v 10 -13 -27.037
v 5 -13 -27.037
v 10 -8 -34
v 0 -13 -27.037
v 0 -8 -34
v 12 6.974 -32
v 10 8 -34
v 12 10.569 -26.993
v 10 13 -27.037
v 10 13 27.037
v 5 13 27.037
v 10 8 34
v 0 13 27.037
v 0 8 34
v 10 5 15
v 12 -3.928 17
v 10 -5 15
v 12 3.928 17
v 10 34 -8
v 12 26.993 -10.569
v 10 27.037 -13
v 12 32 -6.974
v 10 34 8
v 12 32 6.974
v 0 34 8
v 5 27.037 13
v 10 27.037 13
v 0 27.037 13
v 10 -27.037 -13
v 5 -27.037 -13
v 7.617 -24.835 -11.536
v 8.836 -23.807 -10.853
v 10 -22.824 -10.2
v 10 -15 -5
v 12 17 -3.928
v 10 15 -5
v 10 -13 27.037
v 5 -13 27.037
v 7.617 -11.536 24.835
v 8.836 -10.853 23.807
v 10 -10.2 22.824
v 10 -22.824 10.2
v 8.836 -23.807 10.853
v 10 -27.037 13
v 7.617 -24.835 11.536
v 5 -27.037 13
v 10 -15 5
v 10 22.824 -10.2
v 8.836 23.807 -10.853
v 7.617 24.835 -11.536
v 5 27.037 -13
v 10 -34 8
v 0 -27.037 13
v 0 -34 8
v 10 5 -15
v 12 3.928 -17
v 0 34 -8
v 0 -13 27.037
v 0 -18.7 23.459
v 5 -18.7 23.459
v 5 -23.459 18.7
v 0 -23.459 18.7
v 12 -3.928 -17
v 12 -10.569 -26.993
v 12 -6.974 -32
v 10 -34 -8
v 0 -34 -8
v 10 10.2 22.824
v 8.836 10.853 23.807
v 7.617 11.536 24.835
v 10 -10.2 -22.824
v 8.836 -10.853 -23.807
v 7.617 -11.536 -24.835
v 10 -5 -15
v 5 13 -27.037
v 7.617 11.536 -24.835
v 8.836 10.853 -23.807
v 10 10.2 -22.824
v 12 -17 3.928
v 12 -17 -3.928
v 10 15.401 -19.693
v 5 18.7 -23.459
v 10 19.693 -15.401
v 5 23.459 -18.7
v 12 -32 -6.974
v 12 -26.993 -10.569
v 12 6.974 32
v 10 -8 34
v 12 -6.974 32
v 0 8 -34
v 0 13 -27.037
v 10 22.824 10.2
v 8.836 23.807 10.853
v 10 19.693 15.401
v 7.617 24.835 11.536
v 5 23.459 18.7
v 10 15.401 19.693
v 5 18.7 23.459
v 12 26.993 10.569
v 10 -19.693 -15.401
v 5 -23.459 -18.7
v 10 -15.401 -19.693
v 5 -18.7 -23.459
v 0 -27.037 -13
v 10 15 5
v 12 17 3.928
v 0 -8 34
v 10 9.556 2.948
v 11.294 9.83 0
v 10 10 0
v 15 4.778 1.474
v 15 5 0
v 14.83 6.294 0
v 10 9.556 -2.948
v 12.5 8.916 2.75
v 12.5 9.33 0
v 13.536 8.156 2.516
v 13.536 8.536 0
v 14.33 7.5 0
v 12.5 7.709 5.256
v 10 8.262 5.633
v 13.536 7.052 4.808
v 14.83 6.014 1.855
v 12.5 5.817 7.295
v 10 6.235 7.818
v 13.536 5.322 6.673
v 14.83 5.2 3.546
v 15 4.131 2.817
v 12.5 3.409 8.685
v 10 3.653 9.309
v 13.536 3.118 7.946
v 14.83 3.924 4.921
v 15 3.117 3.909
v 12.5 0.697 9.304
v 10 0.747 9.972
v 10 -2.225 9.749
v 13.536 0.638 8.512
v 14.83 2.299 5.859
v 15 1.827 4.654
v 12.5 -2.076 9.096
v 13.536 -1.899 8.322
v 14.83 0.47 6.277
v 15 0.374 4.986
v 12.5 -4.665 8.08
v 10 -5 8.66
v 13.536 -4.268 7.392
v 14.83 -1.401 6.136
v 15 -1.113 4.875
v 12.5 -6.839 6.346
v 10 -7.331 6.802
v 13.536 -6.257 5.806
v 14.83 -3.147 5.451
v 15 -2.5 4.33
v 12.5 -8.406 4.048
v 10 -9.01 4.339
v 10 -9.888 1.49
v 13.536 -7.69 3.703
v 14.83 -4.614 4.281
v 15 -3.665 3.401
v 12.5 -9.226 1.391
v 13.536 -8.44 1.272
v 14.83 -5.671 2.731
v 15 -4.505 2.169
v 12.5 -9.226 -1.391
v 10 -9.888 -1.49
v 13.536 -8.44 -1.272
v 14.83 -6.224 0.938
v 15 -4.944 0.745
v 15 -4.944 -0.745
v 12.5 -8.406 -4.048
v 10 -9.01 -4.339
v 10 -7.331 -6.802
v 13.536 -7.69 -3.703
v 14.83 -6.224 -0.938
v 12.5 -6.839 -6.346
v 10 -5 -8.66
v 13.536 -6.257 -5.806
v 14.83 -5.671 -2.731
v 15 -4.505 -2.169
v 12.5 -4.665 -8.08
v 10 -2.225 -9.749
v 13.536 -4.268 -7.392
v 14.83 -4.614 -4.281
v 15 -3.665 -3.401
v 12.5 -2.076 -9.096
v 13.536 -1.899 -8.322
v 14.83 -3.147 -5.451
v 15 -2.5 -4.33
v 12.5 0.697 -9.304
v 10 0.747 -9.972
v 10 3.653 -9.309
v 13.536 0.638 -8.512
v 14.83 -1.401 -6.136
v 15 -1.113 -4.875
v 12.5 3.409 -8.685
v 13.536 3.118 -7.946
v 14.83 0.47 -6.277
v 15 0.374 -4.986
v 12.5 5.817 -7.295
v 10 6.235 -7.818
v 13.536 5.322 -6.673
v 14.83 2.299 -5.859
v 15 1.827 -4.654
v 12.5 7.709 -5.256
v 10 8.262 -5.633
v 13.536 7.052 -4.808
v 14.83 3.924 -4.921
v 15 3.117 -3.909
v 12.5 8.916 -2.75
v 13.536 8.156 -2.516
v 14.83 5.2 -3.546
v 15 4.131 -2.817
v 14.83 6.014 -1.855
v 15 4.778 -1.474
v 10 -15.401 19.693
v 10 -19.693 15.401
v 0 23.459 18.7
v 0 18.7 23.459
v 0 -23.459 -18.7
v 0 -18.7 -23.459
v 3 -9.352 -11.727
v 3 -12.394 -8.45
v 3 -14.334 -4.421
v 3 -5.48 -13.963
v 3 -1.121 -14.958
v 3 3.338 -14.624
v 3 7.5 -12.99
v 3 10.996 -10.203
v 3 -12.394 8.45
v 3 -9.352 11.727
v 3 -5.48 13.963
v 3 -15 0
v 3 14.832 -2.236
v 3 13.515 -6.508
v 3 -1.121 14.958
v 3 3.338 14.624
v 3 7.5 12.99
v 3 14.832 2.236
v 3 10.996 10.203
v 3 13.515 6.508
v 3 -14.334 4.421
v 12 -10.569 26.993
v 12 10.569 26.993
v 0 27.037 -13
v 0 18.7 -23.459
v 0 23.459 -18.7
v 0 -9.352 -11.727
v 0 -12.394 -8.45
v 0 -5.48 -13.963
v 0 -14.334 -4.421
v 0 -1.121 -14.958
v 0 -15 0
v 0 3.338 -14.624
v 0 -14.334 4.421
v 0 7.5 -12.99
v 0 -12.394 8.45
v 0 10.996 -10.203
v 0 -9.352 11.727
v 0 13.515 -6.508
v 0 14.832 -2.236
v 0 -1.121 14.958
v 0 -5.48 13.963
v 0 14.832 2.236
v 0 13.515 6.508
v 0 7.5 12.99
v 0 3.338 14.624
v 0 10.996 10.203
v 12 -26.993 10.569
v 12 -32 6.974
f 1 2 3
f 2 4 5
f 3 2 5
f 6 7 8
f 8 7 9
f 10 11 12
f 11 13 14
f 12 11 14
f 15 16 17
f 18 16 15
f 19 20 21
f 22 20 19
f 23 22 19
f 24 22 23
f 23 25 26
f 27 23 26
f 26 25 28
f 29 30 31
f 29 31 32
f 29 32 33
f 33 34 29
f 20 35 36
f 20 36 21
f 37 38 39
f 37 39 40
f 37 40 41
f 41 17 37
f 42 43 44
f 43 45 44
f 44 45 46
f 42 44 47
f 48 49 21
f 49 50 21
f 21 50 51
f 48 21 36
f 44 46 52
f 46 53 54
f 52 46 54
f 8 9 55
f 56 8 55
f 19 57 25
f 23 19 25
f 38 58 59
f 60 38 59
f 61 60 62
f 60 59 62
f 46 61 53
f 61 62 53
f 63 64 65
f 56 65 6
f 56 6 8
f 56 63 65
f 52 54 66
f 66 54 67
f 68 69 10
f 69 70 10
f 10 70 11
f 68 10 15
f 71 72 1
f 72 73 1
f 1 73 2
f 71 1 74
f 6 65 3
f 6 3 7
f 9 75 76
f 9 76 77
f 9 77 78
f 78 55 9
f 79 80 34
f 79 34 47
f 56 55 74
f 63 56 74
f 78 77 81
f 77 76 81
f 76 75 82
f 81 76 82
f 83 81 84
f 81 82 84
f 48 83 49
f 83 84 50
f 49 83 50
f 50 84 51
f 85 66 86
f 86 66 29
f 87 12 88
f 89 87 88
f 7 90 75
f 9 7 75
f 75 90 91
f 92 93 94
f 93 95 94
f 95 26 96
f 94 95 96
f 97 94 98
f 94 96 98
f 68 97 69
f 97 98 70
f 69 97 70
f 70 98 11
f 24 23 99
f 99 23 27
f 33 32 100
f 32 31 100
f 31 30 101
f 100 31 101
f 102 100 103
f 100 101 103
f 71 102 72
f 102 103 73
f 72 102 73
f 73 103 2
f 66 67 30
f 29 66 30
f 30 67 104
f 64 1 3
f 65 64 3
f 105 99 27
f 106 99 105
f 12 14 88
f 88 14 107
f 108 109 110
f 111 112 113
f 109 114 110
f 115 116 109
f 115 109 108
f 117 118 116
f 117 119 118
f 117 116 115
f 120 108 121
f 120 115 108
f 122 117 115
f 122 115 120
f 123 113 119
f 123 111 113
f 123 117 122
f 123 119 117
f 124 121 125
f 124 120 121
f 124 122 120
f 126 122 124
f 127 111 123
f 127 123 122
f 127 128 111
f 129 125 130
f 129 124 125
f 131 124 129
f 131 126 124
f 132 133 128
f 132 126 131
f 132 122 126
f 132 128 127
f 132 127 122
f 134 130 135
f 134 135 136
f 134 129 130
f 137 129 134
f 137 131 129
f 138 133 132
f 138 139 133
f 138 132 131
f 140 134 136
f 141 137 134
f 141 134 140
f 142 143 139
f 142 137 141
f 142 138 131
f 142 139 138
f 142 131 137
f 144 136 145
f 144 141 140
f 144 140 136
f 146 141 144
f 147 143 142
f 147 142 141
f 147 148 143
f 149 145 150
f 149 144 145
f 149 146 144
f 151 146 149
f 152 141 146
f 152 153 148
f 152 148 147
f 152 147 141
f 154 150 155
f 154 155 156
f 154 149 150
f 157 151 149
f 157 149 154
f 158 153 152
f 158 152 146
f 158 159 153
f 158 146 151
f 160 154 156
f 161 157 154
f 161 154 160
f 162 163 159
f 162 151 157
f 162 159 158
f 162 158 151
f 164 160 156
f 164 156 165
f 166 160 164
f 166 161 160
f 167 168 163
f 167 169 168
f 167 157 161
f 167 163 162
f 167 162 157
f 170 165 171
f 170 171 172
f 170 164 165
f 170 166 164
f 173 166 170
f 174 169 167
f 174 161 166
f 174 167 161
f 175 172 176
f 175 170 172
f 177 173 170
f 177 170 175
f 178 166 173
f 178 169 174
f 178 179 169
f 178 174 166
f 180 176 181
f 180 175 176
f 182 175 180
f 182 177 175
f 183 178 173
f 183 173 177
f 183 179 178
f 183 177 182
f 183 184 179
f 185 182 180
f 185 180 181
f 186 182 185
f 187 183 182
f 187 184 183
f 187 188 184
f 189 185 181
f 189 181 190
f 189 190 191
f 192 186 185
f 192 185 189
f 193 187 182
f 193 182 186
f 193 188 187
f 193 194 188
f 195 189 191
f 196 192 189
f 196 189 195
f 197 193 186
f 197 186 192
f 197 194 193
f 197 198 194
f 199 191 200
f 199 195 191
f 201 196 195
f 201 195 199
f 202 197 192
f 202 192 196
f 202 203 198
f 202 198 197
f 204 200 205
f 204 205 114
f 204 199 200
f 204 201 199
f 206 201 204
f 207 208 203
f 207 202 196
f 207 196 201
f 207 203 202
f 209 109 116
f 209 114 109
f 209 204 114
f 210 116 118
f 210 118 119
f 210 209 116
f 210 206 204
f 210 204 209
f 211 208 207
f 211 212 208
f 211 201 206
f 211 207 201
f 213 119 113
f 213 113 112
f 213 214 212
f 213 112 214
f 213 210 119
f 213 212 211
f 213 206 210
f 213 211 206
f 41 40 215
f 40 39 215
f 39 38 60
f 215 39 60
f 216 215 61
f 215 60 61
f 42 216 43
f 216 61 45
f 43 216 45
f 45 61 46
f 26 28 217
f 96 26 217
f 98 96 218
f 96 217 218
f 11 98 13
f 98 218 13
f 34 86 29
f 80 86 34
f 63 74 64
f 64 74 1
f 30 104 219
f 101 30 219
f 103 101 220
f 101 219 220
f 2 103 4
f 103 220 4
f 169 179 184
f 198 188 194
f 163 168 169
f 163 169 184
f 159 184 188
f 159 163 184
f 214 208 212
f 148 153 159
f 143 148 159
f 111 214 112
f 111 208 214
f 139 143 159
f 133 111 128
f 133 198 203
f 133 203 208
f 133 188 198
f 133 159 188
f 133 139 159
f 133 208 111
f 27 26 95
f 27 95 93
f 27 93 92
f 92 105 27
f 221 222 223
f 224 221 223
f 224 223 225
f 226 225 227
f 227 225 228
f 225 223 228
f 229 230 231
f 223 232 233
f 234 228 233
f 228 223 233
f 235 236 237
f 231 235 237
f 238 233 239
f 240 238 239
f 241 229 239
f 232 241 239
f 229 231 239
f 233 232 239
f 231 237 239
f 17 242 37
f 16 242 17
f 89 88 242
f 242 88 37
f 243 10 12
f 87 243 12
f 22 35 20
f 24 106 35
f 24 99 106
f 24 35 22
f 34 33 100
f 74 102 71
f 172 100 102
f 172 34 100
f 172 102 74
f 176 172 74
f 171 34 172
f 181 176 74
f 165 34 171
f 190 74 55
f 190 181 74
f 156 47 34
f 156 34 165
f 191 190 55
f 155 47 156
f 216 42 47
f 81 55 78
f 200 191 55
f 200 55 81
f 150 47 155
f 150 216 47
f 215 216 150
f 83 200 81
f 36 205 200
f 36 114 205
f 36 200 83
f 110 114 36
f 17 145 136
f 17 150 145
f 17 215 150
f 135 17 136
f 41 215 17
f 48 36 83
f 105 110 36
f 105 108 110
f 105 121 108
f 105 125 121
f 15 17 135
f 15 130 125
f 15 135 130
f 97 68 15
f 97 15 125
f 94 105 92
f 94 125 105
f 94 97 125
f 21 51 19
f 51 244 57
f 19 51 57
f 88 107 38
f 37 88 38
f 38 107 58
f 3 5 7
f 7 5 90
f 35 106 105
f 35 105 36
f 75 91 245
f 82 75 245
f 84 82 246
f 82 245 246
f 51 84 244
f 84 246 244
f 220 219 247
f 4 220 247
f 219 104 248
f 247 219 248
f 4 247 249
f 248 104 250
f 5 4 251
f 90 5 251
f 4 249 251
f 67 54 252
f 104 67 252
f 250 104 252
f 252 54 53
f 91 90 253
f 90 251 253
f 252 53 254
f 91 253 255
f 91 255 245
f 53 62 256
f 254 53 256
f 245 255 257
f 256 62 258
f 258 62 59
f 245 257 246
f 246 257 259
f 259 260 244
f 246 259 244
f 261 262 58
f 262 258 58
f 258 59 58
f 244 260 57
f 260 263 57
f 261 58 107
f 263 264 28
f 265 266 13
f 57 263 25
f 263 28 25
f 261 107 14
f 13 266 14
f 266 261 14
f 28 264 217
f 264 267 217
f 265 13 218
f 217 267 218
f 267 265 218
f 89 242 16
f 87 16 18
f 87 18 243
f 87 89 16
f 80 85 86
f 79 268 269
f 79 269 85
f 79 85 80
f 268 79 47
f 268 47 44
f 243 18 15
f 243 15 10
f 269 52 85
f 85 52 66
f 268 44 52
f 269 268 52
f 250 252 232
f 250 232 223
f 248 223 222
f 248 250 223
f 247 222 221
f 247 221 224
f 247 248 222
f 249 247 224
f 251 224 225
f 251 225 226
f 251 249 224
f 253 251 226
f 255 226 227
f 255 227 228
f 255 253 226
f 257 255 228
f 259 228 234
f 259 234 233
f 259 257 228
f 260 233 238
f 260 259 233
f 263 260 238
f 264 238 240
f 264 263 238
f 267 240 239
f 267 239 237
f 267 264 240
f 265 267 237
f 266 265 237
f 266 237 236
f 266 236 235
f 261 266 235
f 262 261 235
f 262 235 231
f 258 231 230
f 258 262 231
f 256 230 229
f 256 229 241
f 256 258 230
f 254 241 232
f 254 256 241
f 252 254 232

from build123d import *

# Parameters (mm, degrees)
F1_DEPTH = 10
F2_DEPTH = 12
F3_SIZE  = 5
F4_SIZE  = 1.99999
F5_R     = 10
F6_DEPTH = 5
F7_R     = 4.99999
F9_DEPTH = 3


# Not quite as in the source:
# - a fillet or chamfer is up to 0.001 mm smaller than in the source, because OpenCascade refuses the exact size


with BuildPart() as f1:
    # F0 (on Right) → F1 (new body)
    with BuildSketch(Plane.YZ):
        with BuildLine():
            Line((15, 5), (27.0370116692, 13))
            ThreePointArc((27.0370116692, 13), (21.2132034356, 21.2132034356), (13, 27.0370116692))
            Line((13, 27.0370116692), (5, 15))
            Line((5, 15), (0, 15))
            Line((0, 15), (-5, 15))
            Line((-5, 15), (-13, 27.0370116692))
            ThreePointArc((-13, 27.0370116692), (-21.2132034356, 21.2132034356), (-27.0370116692, 13))
            Line((-27.0370116692, 13), (-15, 5))
            Line((-15, 5), (-15, 0))
            Line((-15, 0), (-15, -5))
            Line((-15, -5), (-27.0370116692, -13))
            ThreePointArc((-27.0370116692, -13), (-21.2132034356, -21.2132034356), (-13, -27.0370116692))
            Line((-13, -27.0370116692), (-5, -15))
            Line((-5, -15), (0, -15))
            Line((0, -15), (5, -15))
            Line((5, -15), (13, -27.0370116692))
            ThreePointArc((13, -27.0370116692), (21.2132034356, -21.2132034356), (27.0370116692, -13))
            Line((27.0370116692, -13), (15, -5))
            Line((15, -5), (15, 0))
            Line((15, 0), (15, 5))
        make_face()
    extrude(amount=F1_DEPTH)

    # F0 (on Right) → F2 (join)
    with BuildSketch(Plane.YZ):
        with BuildLine():
            ThreePointArc((27.0370116692, -13), (29.2498747867, -6.6666952054), (30, 0))
            ThreePointArc((30, 0), (29.2498747867, 6.6666952054), (27.0370116692, 13))
            Line((27.0370116692, 13), (15, 5))
            Line((15, 5), (15, 0))
            Line((15, 0), (15, -5))
            Line((15, -5), (27.0370116692, -13))
        make_face()
        with BuildLine():
            ThreePointArc((27.0370116692, 13), (29.2498747867, 6.6666952054), (30, 0))
            ThreePointArc((30, 0), (29.2498747867, -6.6666952054), (27.0370116692, -13))
            Line((27.0370116692, -13), (34, -8))
            Line((34, -8), (34, 0))
            Line((34, 0), (34, 8))
            Line((34, 8), (27.0370116692, 13))
        make_face()
        with BuildLine():
            Line((5, 15), (13, 27.0370116692))
            ThreePointArc((13, 27.0370116692), (0, 30), (-13, 27.0370116692))
            Line((-13, 27.0370116692), (-5, 15))
            Line((-5, 15), (0, 15))
            Line((0, 15), (5, 15))
        make_face()
        with BuildLine():
            ThreePointArc((-13, 27.0370116692), (0, 30), (13, 27.0370116692))
            Line((13, 27.0370116692), (8, 34))
            Line((8, 34), (0, 34))
            Line((0, 34), (-8, 34))
            Line((-8, 34), (-13, 27.0370116692))
        make_face()
        with BuildLine():
            Line((-15, 5), (-27.0370116692, 13))
            ThreePointArc((-27.0370116692, 13), (-30, 0), (-27.0370116692, -13))
            Line((-27.0370116692, -13), (-15, -5))
            Line((-15, -5), (-15, 0))
            Line((-15, 0), (-15, 5))
        make_face()
        with BuildLine():
            ThreePointArc((-27.0370116692, -13), (-30, 0), (-27.0370116692, 13))
            Line((-27.0370116692, 13), (-34, 8))
            Line((-34, 8), (-34, 0))
            Line((-34, 0), (-34, -8))
            Line((-34, -8), (-27.0370116692, -13))
        make_face()
        with BuildLine():
            ThreePointArc((-13, -27.0370116692), (0, -30), (13, -27.0370116692))
            Line((13, -27.0370116692), (5, -15))
            Line((5, -15), (0, -15))
            Line((0, -15), (-5, -15))
            Line((-5, -15), (-13, -27.0370116692))
        make_face()
        with BuildLine():
            Line((8, -34), (13, -27.0370116692))
            ThreePointArc((13, -27.0370116692), (0, -30), (-13, -27.0370116692))
            Line((-13, -27.0370116692), (-8, -34))
            Line((-8, -34), (0, -34))
            Line((0, -34), (8, -34))
        make_face()
    extrude(amount=F2_DEPTH)

    # F3
    f3_edges = [f1.edges().sort_by_distance(p)[0] for p in [
        (10, 21.213203, 21.213203),
        (10, -21.213203, 21.213203),
        (10, -21.213203, -21.213203),
        (10, 21.213203, -21.213203),
    ]]
    chamfer(f3_edges, length=F3_SIZE)

    # F4 (size 2 in the source; OpenCascade refuses exactly that, so slightly less here)
    f4_edges = [f1.edges().sort_by_distance(p)[0] for p in [
        (12, 0, 34),
        (12, -10.5, 30.518506),
        (12, 10.5, 30.518506),
        (12, -9, 21.018506),
        (12, 9, 21.018506),
        (12, 0, 15),
        (12, -15, 0),
        (12, -21.018506, 9),
        (12, -30.518506, 10.5),
        (12, -34, 0),
        (12, -30.518506, -10.5),
        (12, -21.018506, -9),
        (12, 0, -15),
        (12, -9, -21.018506),
        (12, -10.5, -30.518506),
        (12, 0, -34),
        (12, 10.5, -30.518506),
        (12, 9, -21.018506),
        (12, 15, 0),
        (12, 21.018506, 9),
        (12, 30.518506, 10.5),
        (12, 34, 0),
        (12, 21.018506, -9),
        (12, 30.518506, -10.5),
    ]]
    chamfer(f4_edges, length=F4_SIZE)

    # F5 (on face) → F6 (join)
    with BuildSketch(Plane.YZ.offset(10)):
        Circle(F5_R)
    extrude(amount=F6_DEPTH)

    # F7 (radius 5 in the source; OpenCascade refuses exactly that, so slightly less here)
    f7_edges = [f1.edges().sort_by_distance(p)[0] for p in [
        (15, -10, 0),
    ]]
    fillet(f7_edges, radius=F7_R)

    # F8 (on face) → F9 (cut)
    with BuildSketch(Plane.YZ):
        with BuildLine():
            ThreePointArc((0, -15), (10.6066017178, -10.6066017178), (15, 0))
            ThreePointArc((15, 0), (10.6066017178, 10.6066017178), (0, 15))
            ThreePointArc((0, 15), (-10.6066017178, 10.6066017178), (-15, 0))
            ThreePointArc((-15, 0), (-10.6066017178, -10.6066017178), (0, -15))
        make_face()
    extrude(amount=F9_DEPTH, mode=Mode.SUBTRACT)


solid = f1.part
